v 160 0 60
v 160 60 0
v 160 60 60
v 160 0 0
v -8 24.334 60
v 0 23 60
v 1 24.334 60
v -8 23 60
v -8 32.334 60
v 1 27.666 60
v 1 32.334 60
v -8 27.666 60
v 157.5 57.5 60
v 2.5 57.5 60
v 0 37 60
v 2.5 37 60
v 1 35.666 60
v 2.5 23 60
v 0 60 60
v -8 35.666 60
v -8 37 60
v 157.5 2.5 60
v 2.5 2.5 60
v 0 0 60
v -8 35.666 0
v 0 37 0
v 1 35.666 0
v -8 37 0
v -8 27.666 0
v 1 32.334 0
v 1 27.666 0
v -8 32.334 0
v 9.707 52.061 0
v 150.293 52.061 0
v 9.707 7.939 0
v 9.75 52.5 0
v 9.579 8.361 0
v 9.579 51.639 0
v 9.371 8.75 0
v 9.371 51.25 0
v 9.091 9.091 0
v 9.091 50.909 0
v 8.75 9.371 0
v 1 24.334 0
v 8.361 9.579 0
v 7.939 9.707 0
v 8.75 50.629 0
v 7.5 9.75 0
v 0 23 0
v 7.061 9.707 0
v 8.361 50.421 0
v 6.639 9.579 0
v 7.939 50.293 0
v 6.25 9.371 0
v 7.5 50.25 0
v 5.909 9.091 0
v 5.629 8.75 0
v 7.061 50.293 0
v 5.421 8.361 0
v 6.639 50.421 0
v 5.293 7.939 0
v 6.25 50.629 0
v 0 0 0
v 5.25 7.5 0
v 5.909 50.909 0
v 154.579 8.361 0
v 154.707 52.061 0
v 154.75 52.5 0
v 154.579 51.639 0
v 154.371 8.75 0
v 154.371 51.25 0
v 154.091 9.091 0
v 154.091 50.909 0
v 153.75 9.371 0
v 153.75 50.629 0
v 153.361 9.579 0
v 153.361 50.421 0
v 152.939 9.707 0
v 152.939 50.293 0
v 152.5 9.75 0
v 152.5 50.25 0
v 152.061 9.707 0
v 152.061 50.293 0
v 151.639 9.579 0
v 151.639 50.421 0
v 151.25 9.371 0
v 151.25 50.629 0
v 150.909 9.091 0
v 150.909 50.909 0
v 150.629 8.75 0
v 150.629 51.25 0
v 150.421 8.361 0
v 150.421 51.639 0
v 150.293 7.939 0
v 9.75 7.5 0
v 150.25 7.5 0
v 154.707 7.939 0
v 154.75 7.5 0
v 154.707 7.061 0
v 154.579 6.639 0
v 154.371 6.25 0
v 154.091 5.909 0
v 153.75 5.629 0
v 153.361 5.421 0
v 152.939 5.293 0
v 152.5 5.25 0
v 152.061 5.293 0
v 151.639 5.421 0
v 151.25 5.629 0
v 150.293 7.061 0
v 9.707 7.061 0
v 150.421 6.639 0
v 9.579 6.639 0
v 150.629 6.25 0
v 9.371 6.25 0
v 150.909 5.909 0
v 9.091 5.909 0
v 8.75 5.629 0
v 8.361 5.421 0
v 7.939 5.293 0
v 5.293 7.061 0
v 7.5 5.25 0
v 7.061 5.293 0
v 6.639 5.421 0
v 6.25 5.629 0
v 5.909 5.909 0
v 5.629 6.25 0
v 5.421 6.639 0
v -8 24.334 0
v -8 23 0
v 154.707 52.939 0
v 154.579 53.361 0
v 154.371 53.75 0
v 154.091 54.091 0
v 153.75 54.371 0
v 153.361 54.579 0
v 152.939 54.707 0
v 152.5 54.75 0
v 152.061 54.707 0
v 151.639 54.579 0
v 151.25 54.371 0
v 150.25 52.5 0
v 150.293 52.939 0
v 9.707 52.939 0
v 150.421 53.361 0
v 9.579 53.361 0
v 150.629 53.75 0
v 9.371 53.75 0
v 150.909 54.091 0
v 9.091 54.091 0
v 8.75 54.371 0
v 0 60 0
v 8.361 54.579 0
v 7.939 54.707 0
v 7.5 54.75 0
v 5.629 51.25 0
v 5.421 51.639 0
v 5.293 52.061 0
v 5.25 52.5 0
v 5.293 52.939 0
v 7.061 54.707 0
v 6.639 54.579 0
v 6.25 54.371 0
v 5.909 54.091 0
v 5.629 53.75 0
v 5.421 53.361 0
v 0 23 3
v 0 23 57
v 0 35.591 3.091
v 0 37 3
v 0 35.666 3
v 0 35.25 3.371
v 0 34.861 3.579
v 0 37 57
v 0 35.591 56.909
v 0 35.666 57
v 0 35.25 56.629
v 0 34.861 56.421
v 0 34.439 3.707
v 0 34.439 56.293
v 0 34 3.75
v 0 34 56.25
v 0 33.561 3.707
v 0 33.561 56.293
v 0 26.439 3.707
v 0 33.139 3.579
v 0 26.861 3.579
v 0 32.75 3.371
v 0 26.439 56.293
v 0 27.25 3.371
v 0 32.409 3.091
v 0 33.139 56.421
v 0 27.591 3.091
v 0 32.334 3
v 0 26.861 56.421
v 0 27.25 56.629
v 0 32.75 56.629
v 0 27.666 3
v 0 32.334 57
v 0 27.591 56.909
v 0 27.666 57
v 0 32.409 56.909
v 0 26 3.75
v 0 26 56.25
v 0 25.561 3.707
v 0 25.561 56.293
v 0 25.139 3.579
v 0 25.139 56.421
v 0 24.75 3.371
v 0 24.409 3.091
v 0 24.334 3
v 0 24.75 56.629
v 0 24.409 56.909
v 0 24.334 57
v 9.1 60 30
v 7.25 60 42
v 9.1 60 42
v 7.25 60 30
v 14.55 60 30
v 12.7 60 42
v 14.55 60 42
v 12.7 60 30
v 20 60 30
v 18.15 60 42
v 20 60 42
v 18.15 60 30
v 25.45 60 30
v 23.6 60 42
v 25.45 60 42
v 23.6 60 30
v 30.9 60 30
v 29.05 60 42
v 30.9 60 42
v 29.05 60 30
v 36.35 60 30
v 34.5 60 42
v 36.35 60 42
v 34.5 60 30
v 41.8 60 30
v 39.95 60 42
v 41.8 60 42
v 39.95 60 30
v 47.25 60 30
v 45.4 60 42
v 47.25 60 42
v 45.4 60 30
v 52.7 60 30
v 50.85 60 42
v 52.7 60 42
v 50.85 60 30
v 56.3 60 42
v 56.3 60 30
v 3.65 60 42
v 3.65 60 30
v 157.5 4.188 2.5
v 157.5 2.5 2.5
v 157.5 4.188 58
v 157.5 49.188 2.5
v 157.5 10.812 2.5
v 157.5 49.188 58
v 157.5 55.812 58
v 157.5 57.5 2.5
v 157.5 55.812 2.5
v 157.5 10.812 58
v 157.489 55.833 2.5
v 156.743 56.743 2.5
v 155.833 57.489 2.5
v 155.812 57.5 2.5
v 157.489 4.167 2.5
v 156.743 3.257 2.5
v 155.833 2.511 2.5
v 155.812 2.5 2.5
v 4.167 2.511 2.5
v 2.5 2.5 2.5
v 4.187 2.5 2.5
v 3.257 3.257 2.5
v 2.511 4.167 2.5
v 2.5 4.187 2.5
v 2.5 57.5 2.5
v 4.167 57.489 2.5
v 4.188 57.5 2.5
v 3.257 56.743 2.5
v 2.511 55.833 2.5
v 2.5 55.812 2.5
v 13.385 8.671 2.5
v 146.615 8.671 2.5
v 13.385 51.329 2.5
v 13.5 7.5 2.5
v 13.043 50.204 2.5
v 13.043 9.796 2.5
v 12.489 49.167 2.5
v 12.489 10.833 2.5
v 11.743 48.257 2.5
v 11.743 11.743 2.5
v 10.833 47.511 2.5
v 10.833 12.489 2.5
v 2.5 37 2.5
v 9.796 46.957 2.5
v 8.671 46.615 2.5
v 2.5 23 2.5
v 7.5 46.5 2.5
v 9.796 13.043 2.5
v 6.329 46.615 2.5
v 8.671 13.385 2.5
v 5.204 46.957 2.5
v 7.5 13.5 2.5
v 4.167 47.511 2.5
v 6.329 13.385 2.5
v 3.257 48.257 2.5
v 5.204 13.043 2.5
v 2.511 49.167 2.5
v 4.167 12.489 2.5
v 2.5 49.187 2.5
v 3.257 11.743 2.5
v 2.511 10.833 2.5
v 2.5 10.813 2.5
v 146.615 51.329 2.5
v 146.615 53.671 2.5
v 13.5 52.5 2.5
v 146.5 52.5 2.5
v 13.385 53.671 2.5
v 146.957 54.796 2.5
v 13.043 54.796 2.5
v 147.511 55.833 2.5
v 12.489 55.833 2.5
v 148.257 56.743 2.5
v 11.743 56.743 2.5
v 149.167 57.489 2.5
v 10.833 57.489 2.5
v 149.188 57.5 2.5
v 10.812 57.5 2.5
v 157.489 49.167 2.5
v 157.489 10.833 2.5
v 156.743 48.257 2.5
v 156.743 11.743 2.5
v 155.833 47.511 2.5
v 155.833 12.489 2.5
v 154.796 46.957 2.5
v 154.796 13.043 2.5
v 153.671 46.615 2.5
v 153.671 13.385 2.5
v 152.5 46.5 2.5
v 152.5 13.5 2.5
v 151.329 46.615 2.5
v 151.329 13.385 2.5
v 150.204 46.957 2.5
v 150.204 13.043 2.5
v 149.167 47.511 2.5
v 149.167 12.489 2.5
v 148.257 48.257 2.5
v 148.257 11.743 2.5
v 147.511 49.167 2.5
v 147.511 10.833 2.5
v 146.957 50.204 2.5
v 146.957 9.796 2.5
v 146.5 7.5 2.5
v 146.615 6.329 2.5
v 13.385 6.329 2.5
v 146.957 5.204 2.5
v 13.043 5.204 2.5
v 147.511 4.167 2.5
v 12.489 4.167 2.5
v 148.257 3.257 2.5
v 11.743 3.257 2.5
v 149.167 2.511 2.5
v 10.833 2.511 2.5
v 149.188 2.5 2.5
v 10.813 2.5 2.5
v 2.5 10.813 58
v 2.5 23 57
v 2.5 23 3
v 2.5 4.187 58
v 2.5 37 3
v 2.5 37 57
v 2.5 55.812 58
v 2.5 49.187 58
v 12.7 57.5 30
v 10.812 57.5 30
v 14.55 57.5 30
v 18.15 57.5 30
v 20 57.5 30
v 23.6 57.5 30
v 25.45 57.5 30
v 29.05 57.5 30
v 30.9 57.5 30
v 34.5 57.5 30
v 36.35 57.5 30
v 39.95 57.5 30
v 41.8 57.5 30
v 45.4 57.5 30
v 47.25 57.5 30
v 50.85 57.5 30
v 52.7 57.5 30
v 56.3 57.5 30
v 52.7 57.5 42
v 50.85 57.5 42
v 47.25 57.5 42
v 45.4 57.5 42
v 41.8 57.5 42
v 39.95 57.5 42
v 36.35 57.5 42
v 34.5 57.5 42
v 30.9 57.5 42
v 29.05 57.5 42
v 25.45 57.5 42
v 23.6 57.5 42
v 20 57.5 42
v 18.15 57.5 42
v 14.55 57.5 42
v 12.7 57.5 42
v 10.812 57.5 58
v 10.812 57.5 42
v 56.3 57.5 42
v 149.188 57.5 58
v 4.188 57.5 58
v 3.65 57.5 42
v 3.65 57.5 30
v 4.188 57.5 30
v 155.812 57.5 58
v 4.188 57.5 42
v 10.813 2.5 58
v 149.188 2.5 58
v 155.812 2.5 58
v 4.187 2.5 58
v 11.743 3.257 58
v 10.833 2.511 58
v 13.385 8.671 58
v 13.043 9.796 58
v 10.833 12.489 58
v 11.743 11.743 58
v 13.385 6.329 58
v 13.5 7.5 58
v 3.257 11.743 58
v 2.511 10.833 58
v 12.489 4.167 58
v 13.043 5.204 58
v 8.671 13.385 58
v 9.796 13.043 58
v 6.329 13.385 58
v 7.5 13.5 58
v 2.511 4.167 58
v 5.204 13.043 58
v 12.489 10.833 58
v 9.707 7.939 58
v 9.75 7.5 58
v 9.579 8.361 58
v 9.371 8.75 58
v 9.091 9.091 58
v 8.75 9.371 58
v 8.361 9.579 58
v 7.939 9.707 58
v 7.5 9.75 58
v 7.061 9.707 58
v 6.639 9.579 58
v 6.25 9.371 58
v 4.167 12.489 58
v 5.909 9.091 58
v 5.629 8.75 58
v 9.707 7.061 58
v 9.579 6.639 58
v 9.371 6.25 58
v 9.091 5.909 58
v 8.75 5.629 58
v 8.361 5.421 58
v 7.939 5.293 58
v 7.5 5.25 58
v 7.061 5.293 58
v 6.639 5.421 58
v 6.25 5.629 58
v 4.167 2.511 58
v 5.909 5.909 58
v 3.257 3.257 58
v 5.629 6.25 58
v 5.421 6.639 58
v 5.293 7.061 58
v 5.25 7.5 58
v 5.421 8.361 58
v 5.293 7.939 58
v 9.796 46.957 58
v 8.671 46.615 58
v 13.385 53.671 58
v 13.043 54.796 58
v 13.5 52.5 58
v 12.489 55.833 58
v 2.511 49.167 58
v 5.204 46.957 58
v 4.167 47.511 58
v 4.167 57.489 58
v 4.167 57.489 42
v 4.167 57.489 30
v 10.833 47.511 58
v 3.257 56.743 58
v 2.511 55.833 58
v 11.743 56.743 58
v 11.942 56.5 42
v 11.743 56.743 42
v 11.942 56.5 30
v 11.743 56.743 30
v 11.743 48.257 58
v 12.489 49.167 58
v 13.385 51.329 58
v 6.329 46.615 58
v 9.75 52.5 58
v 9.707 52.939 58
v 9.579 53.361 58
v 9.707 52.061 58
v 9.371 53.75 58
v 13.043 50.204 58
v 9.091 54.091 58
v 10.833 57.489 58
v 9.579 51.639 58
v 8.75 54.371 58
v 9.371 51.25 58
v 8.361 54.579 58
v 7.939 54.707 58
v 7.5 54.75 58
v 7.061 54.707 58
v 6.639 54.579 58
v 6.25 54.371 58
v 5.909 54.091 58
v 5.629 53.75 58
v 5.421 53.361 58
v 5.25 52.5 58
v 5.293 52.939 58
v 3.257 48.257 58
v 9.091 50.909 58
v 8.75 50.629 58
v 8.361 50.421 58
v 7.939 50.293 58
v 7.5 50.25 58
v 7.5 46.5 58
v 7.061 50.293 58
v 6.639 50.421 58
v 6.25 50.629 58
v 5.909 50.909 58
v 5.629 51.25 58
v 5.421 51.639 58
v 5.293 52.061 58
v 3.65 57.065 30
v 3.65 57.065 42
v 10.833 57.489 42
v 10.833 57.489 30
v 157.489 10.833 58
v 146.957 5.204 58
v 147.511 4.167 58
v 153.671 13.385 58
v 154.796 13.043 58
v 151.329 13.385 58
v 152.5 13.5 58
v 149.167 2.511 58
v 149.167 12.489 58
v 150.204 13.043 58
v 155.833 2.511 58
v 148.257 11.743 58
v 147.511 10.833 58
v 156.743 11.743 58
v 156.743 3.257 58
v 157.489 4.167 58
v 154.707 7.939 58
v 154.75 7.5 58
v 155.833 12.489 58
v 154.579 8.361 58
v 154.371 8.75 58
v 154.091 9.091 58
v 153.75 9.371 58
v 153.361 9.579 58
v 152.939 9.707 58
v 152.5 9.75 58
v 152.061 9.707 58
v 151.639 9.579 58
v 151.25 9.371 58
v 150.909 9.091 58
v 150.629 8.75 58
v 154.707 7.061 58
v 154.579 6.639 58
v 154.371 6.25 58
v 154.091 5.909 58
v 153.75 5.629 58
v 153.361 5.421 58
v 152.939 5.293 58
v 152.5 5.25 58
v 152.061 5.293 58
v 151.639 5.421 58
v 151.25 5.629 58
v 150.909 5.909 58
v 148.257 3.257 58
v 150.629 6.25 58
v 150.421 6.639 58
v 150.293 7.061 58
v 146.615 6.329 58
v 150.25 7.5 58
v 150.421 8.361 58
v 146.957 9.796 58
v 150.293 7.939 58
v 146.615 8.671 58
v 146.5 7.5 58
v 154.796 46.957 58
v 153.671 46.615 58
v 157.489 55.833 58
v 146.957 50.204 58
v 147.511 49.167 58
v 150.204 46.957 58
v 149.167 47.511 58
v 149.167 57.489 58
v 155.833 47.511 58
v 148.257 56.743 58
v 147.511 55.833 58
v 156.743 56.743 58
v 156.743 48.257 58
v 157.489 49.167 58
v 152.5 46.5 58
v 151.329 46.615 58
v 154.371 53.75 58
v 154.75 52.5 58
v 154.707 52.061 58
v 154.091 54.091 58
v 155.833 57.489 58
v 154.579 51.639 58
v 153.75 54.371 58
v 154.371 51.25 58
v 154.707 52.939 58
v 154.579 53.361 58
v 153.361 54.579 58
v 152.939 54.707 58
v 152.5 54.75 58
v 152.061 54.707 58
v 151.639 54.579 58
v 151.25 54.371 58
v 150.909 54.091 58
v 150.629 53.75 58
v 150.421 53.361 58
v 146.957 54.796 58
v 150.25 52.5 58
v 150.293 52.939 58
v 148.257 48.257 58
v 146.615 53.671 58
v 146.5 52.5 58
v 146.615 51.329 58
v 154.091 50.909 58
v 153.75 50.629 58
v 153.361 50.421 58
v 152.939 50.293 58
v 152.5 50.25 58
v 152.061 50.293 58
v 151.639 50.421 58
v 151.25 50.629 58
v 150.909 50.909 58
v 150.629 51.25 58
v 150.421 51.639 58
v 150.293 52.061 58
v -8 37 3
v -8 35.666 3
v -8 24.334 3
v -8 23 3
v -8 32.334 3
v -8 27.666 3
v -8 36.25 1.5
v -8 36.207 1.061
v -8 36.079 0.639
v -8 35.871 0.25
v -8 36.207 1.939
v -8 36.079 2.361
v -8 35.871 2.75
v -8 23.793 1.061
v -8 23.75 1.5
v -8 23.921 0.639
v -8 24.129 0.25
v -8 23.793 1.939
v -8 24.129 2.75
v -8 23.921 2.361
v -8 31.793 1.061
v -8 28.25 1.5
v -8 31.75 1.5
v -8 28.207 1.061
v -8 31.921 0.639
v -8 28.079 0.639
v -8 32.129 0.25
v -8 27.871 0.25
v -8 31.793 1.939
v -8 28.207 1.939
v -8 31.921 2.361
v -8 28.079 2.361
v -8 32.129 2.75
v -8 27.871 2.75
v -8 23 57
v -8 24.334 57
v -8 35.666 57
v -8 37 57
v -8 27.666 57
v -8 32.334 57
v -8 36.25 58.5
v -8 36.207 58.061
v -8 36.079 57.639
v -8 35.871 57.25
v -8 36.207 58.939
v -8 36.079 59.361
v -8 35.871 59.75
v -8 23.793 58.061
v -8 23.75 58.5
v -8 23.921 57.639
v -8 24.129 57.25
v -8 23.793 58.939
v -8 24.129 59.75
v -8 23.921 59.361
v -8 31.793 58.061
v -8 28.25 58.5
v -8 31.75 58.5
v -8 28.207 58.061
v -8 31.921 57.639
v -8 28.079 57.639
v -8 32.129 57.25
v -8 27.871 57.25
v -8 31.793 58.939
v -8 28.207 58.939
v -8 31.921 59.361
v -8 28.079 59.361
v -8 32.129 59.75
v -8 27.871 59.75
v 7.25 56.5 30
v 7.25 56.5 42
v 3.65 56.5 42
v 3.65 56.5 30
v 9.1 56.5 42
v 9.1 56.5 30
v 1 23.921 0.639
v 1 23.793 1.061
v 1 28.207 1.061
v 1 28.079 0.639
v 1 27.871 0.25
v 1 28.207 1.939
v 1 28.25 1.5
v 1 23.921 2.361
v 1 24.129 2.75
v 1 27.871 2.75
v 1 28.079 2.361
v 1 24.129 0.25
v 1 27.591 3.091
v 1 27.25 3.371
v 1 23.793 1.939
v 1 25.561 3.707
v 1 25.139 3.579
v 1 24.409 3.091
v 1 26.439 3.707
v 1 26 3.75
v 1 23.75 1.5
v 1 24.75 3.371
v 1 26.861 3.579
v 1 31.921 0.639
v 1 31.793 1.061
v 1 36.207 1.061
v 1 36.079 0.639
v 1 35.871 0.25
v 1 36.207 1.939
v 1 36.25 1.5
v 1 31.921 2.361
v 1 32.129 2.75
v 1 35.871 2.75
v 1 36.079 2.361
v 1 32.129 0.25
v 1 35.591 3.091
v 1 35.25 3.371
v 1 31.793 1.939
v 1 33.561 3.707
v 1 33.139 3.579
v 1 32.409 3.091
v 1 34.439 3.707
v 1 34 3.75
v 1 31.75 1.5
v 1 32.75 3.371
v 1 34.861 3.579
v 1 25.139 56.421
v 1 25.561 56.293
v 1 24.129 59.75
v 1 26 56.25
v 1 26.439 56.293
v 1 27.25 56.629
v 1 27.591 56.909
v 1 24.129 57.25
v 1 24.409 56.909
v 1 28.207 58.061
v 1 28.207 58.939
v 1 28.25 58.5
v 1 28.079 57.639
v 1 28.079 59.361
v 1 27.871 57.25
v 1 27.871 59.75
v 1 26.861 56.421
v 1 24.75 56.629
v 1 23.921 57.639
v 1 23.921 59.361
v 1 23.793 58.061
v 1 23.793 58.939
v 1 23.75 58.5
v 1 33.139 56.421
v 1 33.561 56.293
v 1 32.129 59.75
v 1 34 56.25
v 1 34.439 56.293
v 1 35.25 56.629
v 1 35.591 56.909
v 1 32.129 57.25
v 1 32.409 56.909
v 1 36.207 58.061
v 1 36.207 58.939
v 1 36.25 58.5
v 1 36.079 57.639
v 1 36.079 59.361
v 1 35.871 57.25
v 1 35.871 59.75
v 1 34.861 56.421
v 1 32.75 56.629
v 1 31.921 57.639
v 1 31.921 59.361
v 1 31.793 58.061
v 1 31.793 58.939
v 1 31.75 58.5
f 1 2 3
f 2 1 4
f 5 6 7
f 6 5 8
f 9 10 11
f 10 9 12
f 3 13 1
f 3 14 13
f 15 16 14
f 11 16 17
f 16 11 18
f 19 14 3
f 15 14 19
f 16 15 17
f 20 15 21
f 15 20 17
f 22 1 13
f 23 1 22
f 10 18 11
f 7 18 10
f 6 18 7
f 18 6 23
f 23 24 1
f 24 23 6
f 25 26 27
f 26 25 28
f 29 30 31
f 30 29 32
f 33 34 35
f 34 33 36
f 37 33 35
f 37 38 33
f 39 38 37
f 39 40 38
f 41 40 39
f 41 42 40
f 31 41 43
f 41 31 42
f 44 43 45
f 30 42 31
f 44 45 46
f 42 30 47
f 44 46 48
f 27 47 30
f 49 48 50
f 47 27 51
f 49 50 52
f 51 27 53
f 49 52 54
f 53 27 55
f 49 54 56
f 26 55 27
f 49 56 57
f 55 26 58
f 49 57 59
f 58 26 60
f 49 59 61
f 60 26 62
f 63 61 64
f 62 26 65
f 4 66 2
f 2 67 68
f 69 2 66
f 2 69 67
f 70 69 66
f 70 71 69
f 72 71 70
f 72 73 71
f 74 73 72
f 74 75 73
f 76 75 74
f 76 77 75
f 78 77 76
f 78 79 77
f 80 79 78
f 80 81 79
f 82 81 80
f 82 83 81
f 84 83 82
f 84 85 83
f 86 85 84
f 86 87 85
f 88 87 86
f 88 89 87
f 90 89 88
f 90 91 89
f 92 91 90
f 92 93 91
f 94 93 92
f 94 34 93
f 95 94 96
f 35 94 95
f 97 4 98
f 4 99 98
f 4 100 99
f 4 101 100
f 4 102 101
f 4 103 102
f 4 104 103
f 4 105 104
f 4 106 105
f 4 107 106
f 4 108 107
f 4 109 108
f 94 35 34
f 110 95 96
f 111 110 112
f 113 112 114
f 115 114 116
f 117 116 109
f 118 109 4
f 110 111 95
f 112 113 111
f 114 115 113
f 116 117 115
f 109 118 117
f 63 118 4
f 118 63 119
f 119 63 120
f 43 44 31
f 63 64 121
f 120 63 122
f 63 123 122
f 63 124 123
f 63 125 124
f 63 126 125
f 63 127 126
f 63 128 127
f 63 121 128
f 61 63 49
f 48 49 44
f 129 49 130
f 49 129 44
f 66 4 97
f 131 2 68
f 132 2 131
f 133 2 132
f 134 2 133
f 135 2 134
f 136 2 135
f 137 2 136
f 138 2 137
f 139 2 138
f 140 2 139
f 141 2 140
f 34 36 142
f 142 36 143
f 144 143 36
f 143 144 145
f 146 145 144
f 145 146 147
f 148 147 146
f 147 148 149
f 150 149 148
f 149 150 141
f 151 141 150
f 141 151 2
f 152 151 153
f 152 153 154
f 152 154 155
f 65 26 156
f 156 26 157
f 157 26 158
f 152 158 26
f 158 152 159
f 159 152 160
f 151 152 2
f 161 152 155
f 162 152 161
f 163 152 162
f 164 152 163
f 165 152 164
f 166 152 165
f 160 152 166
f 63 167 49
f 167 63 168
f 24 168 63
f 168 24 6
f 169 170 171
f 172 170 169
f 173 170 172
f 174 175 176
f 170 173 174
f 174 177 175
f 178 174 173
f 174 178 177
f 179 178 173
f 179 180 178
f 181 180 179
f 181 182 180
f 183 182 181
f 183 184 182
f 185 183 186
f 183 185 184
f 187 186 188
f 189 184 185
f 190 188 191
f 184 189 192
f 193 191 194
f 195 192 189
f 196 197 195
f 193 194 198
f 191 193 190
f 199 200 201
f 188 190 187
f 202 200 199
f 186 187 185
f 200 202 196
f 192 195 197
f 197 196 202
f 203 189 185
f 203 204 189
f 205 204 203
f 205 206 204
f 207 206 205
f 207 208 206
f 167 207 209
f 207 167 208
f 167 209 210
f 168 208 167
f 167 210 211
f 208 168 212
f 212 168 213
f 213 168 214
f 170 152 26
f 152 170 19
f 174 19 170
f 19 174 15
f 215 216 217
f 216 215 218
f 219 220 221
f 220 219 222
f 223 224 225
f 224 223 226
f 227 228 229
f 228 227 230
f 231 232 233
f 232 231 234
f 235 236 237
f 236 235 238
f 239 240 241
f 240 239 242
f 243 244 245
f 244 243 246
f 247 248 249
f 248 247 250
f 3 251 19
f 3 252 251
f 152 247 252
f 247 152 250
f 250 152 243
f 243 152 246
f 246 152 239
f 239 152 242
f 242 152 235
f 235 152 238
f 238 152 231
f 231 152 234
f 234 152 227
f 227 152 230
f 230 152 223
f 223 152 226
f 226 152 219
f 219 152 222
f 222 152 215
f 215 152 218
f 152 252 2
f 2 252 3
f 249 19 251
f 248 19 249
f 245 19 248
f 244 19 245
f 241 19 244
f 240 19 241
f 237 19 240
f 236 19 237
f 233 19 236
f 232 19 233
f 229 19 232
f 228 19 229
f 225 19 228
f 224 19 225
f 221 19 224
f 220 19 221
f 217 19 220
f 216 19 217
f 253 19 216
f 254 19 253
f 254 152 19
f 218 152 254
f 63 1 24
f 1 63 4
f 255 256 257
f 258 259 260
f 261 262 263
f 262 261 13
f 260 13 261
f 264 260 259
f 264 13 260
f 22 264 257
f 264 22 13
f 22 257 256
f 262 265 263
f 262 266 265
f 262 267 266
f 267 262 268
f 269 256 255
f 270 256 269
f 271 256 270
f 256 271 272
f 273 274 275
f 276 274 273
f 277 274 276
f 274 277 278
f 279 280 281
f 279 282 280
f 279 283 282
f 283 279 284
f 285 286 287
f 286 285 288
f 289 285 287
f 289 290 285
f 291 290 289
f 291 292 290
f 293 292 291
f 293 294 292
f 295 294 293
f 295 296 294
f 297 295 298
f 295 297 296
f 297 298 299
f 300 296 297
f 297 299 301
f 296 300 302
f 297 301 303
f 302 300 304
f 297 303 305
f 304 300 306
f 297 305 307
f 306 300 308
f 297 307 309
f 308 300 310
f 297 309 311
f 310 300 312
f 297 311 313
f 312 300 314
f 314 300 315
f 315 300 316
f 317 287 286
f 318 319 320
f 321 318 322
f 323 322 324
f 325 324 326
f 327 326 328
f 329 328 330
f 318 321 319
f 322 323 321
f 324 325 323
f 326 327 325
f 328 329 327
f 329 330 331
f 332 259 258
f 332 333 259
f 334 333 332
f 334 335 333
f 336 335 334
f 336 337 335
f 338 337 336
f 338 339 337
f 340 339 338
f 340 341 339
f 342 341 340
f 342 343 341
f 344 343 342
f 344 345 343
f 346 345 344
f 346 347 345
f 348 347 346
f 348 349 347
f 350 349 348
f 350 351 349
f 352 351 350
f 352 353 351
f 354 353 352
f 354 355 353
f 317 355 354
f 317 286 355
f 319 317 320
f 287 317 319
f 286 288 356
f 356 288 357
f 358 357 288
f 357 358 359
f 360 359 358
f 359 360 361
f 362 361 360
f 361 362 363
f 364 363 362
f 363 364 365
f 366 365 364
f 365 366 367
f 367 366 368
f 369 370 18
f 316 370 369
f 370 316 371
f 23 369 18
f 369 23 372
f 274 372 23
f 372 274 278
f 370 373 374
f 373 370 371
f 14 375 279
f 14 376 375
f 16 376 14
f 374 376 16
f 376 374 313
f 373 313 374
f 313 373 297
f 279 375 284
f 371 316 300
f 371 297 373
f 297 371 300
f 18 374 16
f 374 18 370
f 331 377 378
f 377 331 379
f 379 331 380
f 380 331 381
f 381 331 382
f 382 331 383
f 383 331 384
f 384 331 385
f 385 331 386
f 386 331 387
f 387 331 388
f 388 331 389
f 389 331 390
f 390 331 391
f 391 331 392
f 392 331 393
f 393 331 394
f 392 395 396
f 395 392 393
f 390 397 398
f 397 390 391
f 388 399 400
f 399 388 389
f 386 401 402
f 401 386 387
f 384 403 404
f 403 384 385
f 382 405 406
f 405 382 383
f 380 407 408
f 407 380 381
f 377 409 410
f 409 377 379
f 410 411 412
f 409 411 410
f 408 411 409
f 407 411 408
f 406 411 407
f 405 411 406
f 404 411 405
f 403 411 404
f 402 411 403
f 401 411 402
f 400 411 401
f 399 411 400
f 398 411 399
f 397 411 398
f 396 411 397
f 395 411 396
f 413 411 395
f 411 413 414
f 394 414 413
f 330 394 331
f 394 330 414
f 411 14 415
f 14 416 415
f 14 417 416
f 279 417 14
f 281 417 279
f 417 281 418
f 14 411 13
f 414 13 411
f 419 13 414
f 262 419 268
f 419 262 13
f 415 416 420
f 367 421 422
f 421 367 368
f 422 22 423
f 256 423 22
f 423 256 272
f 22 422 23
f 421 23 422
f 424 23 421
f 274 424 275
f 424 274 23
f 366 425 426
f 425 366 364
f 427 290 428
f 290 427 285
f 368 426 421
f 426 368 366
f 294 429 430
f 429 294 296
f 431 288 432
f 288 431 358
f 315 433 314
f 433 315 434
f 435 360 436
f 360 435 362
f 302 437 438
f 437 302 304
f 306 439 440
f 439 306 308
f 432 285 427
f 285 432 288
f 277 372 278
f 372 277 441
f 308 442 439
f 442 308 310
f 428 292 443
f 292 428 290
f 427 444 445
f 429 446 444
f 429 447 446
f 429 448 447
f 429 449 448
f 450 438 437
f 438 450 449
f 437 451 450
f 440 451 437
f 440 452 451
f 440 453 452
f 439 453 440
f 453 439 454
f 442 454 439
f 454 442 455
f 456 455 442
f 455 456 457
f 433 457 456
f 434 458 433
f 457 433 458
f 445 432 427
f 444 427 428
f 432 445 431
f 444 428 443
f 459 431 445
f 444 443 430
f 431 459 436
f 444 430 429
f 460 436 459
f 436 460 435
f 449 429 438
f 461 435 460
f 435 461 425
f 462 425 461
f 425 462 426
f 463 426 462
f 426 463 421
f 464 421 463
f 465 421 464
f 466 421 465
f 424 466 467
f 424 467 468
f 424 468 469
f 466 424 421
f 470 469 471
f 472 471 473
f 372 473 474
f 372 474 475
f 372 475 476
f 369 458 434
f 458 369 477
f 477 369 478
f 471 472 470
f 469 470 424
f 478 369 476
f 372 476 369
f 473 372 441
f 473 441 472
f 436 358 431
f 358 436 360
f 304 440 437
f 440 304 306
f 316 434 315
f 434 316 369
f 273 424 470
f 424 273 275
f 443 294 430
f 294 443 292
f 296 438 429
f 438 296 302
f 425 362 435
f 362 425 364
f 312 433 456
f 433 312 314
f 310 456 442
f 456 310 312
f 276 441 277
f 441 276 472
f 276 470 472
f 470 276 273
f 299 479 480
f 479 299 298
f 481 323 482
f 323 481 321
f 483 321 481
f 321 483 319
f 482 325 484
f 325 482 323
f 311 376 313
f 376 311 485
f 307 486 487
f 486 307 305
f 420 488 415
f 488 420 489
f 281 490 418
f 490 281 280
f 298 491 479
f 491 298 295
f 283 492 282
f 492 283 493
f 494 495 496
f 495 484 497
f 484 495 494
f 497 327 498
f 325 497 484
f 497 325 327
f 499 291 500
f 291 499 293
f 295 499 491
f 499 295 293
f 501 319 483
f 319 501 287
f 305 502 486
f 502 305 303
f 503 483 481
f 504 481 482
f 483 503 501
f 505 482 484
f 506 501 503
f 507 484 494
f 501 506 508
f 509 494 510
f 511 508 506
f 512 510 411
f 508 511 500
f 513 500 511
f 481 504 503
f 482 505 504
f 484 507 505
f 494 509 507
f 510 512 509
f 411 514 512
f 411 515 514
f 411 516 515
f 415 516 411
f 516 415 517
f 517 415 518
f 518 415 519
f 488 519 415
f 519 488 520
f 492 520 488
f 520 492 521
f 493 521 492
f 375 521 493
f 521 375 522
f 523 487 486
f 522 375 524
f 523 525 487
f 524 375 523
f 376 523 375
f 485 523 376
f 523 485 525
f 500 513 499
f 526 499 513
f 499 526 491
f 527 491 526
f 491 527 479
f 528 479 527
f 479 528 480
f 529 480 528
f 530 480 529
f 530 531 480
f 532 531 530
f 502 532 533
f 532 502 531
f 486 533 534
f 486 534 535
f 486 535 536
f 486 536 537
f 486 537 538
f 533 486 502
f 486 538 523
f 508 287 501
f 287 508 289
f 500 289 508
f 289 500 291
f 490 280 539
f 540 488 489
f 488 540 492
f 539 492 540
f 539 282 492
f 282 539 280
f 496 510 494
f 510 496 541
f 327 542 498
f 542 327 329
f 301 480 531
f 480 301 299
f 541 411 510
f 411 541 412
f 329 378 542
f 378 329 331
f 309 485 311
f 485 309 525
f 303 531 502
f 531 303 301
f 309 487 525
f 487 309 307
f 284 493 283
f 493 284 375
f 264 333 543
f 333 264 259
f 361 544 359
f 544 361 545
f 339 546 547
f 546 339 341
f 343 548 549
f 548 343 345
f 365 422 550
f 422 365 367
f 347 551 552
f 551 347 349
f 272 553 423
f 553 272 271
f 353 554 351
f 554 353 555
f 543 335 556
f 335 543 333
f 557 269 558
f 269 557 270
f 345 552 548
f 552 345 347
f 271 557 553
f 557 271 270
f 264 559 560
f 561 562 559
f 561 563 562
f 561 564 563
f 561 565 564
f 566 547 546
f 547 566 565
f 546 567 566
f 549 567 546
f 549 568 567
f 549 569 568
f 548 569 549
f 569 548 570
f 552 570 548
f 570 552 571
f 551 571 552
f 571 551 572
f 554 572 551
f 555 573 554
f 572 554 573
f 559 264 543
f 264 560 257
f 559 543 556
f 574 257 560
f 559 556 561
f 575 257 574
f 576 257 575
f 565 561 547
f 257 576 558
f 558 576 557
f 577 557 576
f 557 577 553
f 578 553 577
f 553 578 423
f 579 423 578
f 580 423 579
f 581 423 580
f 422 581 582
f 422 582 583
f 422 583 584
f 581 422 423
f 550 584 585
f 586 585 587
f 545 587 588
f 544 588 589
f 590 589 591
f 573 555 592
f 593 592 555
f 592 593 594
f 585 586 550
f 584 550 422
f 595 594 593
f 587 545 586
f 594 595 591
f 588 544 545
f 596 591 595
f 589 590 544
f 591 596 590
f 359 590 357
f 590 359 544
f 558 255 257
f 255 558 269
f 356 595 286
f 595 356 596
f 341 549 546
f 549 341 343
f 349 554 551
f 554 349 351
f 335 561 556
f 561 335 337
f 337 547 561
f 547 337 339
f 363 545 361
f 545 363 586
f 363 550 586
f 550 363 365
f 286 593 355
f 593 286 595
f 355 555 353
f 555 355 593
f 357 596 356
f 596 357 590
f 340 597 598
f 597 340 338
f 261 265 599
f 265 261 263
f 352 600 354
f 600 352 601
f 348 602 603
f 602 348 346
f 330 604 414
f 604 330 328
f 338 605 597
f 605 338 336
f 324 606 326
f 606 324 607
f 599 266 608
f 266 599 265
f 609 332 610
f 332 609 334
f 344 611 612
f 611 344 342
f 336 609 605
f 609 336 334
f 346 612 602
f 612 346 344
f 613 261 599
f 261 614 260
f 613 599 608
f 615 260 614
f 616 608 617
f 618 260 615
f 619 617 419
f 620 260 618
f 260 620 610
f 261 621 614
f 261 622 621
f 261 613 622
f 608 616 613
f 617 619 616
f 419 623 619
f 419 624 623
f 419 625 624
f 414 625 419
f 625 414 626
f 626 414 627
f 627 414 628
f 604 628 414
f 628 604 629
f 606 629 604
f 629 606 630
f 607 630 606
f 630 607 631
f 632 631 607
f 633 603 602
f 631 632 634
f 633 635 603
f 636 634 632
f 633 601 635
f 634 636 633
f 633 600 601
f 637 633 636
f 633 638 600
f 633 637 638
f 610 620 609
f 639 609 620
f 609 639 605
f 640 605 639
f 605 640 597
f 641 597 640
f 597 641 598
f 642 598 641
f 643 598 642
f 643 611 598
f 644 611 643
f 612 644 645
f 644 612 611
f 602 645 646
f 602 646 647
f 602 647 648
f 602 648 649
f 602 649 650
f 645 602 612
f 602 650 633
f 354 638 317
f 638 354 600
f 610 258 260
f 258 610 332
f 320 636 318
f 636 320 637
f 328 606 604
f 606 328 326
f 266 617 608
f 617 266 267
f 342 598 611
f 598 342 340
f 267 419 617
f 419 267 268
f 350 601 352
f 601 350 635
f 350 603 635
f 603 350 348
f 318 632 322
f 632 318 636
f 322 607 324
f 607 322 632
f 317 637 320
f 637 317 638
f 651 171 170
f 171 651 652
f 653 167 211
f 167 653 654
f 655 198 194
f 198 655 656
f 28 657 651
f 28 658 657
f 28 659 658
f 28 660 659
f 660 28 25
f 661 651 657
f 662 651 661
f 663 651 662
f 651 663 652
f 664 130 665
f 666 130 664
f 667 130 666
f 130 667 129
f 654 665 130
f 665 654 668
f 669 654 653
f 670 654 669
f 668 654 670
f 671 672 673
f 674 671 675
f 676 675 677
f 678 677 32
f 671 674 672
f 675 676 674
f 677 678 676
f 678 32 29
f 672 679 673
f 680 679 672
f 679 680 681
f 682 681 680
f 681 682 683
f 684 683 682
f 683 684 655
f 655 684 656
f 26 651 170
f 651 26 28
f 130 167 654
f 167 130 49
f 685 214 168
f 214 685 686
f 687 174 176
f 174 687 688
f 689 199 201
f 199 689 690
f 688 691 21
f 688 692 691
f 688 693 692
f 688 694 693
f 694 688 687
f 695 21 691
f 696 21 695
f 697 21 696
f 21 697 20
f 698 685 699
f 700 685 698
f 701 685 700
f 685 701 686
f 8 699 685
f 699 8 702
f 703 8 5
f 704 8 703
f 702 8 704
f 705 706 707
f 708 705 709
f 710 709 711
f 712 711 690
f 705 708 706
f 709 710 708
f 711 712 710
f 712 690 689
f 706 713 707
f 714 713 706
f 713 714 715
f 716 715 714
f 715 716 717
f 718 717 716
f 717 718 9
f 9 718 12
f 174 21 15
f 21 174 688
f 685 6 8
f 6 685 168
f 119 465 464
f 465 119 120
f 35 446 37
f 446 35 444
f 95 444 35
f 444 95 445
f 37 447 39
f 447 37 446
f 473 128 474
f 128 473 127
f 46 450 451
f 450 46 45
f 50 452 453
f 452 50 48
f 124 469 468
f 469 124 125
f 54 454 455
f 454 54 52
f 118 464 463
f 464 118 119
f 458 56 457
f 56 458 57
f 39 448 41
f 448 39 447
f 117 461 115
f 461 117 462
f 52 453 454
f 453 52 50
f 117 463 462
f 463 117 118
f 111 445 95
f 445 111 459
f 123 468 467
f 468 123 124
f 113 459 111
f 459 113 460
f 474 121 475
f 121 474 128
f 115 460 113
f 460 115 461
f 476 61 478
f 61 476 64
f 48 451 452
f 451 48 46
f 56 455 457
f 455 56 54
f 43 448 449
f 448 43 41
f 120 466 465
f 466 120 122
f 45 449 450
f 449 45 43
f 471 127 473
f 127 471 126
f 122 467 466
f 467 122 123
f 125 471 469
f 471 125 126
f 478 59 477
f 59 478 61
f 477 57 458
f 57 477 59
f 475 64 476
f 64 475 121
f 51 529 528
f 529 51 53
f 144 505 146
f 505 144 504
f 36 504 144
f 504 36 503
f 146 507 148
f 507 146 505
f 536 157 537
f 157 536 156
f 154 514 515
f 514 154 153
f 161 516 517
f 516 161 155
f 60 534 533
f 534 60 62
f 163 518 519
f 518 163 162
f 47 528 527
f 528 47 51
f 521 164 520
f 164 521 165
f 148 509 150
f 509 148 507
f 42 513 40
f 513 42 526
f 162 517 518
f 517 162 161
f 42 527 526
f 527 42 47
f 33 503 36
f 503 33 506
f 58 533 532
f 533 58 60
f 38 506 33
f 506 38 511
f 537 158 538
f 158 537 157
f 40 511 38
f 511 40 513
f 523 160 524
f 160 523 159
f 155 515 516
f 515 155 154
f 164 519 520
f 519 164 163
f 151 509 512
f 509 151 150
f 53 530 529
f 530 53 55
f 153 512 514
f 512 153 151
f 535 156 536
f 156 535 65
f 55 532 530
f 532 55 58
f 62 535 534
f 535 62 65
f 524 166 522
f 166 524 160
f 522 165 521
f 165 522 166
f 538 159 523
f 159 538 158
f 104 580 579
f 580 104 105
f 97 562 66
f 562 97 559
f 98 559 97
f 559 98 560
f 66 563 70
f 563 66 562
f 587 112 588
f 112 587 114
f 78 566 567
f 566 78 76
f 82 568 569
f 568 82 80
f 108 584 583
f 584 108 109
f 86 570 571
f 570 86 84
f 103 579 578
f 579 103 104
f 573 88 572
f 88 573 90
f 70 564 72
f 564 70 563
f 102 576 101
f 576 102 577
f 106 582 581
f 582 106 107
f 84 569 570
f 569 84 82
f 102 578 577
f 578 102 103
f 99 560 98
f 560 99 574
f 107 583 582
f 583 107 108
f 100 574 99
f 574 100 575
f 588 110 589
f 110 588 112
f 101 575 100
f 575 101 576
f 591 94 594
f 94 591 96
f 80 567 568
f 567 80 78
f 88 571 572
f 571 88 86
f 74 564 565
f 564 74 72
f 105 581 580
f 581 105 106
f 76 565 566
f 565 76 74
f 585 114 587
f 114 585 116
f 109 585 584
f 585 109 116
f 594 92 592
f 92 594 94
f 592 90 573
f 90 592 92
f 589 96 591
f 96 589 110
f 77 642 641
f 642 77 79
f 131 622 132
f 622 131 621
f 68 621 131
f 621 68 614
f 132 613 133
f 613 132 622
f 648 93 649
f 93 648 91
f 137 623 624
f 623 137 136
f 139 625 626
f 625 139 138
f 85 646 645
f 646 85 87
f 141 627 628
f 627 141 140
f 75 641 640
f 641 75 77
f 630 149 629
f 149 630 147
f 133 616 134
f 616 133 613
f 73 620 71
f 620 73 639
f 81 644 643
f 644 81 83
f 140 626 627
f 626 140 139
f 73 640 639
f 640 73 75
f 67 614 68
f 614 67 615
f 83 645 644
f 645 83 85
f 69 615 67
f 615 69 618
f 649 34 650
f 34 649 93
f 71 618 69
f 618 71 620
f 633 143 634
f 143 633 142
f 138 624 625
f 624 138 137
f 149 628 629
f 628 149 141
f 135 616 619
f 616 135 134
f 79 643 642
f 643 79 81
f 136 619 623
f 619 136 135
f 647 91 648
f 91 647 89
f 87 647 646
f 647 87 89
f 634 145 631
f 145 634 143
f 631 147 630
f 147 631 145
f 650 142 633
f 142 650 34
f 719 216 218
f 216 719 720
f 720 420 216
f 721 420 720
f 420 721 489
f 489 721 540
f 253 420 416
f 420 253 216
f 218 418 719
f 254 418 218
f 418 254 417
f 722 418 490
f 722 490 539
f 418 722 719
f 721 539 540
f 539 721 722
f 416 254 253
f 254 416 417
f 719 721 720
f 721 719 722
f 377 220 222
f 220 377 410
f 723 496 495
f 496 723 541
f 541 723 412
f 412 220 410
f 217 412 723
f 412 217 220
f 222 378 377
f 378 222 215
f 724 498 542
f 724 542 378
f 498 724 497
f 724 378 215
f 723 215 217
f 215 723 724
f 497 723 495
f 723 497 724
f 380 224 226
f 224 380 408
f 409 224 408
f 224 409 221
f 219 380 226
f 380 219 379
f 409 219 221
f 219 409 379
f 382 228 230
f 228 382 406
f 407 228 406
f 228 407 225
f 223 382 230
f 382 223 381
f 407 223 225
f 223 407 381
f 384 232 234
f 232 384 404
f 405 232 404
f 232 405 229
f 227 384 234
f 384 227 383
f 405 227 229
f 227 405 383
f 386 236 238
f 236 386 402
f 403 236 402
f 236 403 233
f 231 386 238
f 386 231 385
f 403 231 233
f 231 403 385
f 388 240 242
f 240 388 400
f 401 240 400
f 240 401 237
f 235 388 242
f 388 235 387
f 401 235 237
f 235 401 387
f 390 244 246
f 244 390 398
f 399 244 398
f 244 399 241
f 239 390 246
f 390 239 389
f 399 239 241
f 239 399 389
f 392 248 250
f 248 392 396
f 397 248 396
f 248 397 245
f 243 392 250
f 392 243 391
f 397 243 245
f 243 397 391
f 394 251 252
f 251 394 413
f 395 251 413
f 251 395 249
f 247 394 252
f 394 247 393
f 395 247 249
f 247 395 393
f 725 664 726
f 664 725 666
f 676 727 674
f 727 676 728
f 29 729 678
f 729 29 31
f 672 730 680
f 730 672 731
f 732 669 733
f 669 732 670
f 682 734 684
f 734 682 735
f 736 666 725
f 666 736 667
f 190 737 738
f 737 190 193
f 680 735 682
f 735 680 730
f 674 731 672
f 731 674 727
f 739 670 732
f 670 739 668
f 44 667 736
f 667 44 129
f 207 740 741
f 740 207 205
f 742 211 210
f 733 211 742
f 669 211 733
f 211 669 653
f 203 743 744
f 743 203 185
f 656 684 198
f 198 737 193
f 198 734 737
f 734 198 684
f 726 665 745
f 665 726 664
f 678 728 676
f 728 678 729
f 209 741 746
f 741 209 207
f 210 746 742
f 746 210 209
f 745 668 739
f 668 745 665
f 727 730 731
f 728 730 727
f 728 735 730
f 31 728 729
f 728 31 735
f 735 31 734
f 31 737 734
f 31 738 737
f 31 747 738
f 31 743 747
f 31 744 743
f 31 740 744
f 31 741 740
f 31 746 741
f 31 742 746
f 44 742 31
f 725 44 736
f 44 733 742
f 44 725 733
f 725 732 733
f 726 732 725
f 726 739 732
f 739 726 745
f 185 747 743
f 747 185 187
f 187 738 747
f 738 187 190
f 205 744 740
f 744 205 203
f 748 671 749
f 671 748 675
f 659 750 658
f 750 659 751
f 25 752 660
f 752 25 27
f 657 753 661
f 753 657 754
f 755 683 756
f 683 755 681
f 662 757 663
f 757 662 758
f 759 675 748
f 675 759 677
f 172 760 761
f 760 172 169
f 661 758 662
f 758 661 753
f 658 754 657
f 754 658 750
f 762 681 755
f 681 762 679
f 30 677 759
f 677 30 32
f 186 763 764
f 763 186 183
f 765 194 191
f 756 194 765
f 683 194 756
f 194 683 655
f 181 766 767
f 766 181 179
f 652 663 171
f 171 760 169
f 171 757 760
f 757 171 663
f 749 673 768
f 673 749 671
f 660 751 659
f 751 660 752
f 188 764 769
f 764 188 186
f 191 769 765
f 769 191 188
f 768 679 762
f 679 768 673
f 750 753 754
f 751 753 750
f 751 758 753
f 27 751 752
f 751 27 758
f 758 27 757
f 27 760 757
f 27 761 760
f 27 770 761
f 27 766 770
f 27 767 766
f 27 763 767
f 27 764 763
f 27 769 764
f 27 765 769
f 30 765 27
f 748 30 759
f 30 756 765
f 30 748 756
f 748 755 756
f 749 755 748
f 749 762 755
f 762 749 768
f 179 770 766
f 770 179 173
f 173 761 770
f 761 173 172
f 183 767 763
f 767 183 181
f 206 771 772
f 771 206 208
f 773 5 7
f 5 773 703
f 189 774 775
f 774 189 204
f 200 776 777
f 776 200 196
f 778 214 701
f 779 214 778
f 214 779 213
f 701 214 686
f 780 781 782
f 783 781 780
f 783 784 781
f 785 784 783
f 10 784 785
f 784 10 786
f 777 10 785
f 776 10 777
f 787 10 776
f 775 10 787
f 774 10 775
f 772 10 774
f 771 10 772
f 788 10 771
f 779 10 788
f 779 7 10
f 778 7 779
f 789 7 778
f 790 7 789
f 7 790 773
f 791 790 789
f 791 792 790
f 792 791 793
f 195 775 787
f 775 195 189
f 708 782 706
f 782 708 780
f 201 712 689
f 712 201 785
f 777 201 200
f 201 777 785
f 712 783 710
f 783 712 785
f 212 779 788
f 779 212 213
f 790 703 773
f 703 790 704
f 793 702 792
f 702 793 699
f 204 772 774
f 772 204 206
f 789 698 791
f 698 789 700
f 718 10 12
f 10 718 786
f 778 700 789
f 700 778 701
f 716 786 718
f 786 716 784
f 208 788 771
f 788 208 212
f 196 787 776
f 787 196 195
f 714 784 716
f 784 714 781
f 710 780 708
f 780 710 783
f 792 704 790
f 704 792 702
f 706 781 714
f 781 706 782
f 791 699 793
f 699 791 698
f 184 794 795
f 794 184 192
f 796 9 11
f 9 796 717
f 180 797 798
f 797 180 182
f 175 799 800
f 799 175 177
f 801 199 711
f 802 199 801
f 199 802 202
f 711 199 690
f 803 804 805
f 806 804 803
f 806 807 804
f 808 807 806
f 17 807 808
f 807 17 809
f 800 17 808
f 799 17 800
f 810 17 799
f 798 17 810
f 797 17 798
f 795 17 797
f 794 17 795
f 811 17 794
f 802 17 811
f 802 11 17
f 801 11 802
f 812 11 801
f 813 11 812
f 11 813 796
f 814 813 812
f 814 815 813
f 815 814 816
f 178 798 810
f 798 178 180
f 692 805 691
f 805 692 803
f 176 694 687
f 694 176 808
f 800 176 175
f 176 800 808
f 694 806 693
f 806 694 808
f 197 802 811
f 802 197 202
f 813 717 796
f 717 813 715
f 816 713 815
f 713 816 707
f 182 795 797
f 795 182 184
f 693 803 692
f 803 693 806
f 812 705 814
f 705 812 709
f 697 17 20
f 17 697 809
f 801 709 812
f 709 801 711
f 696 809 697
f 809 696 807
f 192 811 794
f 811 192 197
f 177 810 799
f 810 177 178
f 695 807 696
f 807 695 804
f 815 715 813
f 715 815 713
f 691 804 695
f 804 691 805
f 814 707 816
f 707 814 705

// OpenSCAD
$fn = 32;

// ----------------------------------------------------------------------
// Enclosure body: 160 x 60 x 60 mm, wall 2.5 mm
// ----------------------------------------------------------------------

// --- parameters (mm) ---
length = 160;             // outside length, X
width = 60;               // outside width, Y
height = 60;              // outside height, Z
wall = 2.5;               // side wall thickness
floor_t = 2.5;            // floor thickness
boss_d = 12;              // corner boss diameter
boss_h = 55.5;            // corner boss height above the floor
boss_hole_d = 4.5;        // lid screw clearance in the boss
boss_lip = 7.5;           // boss centre inset from the corner
ear_w = 14;               // mounting ear width
ear_t = 3;                // mounting ear thickness
ear_ext = 8;              // mounting ear reach
ear_hole_d = 4.5;         // mounting ear drills
vent_slots = 10;          // vent slots in the long wall
vent_w = 3.6;             // vent slot width
vent_h = 12;              // vent slot height
vent_pitch = 5.45;        // vent slot pitch
vent_z = 30;              // vent slot sill height

module shell() {
  difference() {
    cube([length, width, height]);
    /* hollow, open at the top */
    translate([wall, wall, floor_t])
      cube([length - 2 * wall, width - 2 * wall, height]);
  }
}

module bosses() {
  /* corner bosses, sunk 1 mm into the floor */
  for (sx = [0, 1]) for (sy = [0, 1])
    translate([sx * (length - 2 * boss_lip) + boss_lip, sy * (width - 2 * boss_lip) + boss_lip, floor_t - 1])
      cylinder(h = boss_h + 1, d = boss_d);
}

module ears() {
  /* mounting ears on the short walls, sunk into the wall */
  for (sz = [0, 1])
    translate([-ear_ext, width / 2 - ear_w / 2, sz * (height - ear_t)])
      cube([ear_ext + 2.5, ear_w, ear_t]);
}

difference() {
  union() {
    shell();
    bosses();
    ears();
  }
  /* boss screw holes */
  for (sx = [0, 1]) for (sy = [0, 1])
    translate([sx * (length - 2 * boss_lip) + boss_lip, sy * (width - 2 * boss_lip) + boss_lip, -1]) cylinder(h = floor_t + boss_h + 2, d = boss_hole_d);
  /* vent grille in the +Y wall */
  for (i = [0 : vent_slots - 1]) translate([vent_pitch * (i + 1) - vent_w / 2, width - wall - 1, vent_z]) cube([vent_w, wall + 2, vent_h]);
  for (sz = [0, 1]) for (sx = [0, 1]) translate([-ear_ext - 1, width / 2 + (2 * sx - 1) * (ear_w / 2 - 3), sz * (height - ear_t) + ear_t / 2]) rotate([0, 90, 0]) cylinder(h = ear_ext + 2, d = ear_hole_d);
}
